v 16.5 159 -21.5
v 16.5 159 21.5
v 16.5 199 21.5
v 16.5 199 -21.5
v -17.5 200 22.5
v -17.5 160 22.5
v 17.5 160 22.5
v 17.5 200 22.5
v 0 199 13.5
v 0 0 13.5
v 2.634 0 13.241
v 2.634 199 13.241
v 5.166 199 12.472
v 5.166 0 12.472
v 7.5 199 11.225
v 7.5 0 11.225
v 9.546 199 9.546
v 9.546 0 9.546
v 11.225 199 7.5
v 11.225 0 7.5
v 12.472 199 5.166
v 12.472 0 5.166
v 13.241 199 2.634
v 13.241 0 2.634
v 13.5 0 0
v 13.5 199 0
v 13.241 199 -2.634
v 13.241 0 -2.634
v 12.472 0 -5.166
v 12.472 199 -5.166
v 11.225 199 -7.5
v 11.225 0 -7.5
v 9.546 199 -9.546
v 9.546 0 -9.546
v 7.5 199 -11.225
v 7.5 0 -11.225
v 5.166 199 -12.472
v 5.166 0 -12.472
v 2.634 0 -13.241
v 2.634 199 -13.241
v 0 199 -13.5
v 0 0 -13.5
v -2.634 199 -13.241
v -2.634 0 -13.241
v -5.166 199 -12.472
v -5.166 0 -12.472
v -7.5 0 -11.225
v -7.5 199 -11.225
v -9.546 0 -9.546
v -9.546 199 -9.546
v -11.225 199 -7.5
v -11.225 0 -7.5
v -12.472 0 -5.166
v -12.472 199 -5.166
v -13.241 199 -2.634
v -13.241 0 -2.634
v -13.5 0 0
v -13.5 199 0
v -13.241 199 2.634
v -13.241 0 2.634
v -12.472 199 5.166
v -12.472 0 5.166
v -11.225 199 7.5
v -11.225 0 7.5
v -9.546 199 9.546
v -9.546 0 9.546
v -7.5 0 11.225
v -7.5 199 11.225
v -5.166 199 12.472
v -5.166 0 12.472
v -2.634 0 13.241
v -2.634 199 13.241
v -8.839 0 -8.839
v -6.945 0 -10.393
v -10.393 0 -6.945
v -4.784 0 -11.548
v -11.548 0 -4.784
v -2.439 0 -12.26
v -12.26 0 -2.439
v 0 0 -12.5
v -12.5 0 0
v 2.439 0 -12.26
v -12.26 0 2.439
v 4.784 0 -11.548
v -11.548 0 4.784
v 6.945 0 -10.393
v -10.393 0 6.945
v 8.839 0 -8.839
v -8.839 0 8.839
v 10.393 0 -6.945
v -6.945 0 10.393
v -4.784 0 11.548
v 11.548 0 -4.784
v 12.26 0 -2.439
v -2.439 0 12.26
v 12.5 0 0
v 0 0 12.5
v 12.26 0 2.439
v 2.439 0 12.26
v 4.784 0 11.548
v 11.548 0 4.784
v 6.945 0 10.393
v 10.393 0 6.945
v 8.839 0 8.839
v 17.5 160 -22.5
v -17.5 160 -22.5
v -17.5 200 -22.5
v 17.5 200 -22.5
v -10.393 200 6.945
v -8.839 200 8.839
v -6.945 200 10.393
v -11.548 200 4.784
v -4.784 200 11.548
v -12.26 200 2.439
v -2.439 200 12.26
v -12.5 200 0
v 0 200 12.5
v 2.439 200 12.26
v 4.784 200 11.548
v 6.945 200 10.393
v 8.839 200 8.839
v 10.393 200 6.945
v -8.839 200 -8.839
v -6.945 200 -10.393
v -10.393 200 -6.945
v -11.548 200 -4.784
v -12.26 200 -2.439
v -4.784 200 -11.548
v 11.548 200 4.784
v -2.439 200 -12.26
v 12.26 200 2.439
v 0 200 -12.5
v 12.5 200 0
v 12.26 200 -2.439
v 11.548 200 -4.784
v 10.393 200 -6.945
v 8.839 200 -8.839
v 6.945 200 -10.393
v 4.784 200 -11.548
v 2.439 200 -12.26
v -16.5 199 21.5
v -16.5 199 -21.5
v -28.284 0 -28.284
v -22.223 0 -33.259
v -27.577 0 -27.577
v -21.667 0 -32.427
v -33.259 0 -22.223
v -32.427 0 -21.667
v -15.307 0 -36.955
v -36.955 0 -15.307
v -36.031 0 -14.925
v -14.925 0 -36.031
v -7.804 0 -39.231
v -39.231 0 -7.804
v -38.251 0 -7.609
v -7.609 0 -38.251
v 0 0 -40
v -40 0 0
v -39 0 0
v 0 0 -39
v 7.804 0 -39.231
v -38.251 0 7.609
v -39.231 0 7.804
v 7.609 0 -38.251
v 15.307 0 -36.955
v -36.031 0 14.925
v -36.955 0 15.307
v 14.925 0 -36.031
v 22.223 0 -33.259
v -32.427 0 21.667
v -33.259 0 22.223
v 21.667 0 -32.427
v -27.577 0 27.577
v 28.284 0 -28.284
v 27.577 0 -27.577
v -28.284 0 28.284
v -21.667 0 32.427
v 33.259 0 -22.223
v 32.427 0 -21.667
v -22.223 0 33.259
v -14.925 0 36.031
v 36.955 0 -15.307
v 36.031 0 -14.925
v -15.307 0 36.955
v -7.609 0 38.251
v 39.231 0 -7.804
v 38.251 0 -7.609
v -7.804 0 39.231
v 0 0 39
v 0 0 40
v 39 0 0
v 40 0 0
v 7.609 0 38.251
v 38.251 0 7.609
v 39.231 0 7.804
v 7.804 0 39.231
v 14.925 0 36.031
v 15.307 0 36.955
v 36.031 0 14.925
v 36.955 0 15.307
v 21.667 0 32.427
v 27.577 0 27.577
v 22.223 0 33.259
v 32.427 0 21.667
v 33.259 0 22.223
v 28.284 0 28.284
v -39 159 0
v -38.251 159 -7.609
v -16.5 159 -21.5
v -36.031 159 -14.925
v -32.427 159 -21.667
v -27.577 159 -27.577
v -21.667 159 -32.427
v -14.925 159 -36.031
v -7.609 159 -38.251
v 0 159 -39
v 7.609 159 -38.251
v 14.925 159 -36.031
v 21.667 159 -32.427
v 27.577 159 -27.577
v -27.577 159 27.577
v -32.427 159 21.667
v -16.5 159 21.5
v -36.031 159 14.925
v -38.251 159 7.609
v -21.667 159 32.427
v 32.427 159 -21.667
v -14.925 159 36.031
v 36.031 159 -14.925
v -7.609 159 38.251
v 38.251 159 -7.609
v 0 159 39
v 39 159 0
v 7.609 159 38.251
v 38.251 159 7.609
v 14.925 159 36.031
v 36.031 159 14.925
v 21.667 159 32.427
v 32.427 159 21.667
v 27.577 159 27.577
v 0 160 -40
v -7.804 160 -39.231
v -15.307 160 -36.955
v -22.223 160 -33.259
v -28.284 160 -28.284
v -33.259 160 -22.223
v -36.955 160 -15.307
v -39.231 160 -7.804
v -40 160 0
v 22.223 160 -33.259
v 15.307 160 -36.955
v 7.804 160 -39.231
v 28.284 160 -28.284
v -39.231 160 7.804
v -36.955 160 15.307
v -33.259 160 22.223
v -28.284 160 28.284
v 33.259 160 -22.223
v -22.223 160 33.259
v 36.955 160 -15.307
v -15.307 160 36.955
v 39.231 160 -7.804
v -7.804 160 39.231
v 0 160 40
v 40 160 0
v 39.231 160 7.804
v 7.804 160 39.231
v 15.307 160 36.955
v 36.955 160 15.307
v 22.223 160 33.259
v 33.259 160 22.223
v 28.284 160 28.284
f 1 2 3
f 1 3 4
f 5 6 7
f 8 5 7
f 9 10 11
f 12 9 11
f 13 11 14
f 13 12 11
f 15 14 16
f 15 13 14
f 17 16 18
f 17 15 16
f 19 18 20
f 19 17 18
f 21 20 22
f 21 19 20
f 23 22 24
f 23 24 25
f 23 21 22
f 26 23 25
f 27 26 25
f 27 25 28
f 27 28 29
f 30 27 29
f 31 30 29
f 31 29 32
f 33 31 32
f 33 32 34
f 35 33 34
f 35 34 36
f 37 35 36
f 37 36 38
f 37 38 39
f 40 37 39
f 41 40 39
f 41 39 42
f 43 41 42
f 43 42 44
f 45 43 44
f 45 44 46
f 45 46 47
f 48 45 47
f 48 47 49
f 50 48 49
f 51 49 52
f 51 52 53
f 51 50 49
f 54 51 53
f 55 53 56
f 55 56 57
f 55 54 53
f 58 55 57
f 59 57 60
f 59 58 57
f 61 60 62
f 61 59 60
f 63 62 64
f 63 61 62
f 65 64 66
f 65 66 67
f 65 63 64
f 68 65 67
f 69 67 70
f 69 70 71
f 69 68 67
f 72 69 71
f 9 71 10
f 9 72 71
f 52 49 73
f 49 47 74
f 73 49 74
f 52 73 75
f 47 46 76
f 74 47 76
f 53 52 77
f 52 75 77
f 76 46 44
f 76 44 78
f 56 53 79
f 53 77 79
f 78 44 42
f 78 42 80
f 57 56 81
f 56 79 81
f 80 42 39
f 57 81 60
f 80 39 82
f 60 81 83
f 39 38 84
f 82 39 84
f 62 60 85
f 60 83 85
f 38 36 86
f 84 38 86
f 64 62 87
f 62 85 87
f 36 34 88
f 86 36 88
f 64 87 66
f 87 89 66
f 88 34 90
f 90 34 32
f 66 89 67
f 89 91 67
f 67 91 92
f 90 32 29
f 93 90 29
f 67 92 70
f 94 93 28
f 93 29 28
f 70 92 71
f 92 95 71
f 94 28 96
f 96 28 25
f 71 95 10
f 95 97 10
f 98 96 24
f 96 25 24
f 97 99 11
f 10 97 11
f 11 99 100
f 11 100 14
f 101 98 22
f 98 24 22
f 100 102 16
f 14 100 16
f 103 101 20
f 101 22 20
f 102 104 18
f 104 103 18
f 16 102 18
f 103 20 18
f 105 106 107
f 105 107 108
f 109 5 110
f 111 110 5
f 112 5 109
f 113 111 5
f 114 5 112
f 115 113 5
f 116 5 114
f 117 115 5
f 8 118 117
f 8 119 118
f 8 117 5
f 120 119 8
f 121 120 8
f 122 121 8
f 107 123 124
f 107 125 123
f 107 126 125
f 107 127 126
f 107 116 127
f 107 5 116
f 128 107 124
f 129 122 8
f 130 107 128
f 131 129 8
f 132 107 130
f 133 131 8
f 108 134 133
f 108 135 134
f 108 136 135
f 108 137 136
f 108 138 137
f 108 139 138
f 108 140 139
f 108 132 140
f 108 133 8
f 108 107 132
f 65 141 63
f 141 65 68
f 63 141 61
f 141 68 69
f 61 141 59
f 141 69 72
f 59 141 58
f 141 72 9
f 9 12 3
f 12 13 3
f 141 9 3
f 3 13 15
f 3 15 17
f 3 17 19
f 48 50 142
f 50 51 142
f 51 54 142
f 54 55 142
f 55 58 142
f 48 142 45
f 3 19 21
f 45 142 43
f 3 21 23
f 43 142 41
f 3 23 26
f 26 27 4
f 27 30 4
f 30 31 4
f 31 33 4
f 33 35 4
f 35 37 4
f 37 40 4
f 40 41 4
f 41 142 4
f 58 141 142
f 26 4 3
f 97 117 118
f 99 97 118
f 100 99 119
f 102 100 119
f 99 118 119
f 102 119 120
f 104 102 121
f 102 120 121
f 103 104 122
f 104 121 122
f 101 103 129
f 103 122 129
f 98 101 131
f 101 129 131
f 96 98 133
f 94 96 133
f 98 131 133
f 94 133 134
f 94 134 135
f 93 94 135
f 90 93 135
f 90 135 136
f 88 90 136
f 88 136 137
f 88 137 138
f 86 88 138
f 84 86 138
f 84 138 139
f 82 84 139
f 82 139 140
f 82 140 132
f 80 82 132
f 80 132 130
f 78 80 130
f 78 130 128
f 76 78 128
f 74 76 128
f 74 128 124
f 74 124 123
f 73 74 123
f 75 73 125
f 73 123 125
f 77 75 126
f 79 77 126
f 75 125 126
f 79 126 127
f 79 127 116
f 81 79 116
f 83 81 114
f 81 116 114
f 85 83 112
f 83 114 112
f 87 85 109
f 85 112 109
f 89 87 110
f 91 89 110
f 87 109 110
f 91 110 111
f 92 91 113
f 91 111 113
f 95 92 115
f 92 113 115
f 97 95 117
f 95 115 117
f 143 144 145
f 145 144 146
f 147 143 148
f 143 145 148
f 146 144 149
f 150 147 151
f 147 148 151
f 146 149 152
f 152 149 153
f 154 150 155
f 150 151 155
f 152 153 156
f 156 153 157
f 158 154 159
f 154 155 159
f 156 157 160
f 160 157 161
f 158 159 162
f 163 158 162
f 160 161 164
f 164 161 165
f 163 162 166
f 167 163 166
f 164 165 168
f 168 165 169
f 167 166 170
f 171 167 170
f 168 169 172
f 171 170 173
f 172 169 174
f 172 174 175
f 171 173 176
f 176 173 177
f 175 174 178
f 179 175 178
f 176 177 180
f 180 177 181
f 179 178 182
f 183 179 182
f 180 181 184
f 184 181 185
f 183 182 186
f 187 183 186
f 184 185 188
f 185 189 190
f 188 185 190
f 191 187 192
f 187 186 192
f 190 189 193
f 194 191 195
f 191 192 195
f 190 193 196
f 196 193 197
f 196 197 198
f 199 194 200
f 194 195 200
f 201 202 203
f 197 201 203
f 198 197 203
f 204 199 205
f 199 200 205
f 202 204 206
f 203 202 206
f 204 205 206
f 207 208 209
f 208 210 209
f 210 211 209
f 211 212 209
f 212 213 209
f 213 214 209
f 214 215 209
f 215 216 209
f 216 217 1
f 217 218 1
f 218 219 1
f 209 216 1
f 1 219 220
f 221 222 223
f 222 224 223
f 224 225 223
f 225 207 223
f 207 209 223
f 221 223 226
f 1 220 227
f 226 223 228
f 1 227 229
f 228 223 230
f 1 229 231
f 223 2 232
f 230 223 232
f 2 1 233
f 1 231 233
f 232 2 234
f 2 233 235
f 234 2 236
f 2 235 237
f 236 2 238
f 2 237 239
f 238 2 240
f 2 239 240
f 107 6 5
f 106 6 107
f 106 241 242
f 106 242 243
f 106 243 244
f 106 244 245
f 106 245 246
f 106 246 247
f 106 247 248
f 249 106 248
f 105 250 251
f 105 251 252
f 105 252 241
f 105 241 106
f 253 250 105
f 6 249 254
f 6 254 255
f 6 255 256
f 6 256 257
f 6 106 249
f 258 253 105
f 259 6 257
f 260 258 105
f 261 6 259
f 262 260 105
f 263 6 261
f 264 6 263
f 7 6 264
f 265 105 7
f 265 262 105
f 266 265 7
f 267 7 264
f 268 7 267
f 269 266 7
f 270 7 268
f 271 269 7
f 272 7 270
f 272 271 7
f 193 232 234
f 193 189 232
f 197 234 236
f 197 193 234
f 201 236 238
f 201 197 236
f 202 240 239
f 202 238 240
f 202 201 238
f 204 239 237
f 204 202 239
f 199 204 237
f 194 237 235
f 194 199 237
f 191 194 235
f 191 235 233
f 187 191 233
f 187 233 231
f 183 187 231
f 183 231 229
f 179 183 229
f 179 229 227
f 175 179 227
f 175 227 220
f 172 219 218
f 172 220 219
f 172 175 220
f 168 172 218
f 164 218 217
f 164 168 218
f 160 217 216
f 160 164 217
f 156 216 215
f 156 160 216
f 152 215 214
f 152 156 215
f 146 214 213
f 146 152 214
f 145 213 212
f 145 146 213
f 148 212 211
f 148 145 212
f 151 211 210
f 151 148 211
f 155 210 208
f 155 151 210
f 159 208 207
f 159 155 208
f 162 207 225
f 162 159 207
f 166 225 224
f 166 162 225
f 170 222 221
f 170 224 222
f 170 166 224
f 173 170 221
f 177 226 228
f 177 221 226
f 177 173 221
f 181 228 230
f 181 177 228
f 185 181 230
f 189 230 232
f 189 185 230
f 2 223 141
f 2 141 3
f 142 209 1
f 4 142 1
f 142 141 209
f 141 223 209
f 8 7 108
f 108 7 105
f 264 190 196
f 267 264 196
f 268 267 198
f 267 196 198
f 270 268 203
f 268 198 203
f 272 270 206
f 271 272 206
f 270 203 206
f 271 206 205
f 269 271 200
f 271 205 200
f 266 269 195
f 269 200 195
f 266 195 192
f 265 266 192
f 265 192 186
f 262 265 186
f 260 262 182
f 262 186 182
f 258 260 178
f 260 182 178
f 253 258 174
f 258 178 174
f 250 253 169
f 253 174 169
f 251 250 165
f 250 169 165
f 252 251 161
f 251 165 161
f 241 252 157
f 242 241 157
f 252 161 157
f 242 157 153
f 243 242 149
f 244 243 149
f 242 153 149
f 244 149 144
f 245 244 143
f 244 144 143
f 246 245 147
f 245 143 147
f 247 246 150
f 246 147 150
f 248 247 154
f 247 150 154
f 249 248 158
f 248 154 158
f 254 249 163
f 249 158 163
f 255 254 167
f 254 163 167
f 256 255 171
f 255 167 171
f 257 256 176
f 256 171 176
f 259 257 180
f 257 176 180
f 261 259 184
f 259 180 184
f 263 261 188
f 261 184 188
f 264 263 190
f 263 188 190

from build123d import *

# Parameters (mm, degrees)
SKETCH_1_R          = 40
EXTRUDE_1_DEPTH     = 160
SKETCH_2_W          = 35
SKETCH_2_H          = 45
EXTRUDE_2_DEPTH     = 40
SKETCH_7_R          = 12.5
CUT_EXTRUDE_2_DEPTH = 208.846096908
SHELL_1_T           = -1


with BuildPart() as part:
    # Эскиз1 → Бобышка-Вытянуть1 (new body)
    with BuildSketch(Plane(origin=(0, 0, 0), x_dir=(1, 0, 0), z_dir=(0, 1, 0))):
        with Locations(Location((0, 0, 0), (0, 0, 270))):
            Circle(SKETCH_1_R)
    extrude(amount=EXTRUDE_1_DEPTH)

    # Эскиз2 → Бобышка-Вытянуть2 (add)
    with BuildSketch(Plane(origin=(0, 160, 0), x_dir=(1, 0, 0), z_dir=(0, 1, 0))):
        Rectangle(SKETCH_2_W, SKETCH_2_H)
    extrude(amount=EXTRUDE_2_DEPTH)

    # Эскиз7 → Вырез-Вытянуть2 (cut, through all)
    with BuildSketch(Plane(origin=(0, 200, 0), x_dir=(1, 0, 0), z_dir=(0, 1, 0))):
        with Locations(Location((0, 0, 0), (0, 0, 270))):
            Circle(SKETCH_7_R)
    extrude(amount=-CUT_EXTRUDE_2_DEPTH, mode=Mode.SUBTRACT)

    # Оболочка1
    shell_1_openings = [part.faces().sort_by_distance(p)[0] for p in [
        (0, 0, -38.86862915),
    ]]
    offset(amount=SHELL_1_T, openings=shell_1_openings, kind=Kind.INTERSECTION)


solid = part.part
